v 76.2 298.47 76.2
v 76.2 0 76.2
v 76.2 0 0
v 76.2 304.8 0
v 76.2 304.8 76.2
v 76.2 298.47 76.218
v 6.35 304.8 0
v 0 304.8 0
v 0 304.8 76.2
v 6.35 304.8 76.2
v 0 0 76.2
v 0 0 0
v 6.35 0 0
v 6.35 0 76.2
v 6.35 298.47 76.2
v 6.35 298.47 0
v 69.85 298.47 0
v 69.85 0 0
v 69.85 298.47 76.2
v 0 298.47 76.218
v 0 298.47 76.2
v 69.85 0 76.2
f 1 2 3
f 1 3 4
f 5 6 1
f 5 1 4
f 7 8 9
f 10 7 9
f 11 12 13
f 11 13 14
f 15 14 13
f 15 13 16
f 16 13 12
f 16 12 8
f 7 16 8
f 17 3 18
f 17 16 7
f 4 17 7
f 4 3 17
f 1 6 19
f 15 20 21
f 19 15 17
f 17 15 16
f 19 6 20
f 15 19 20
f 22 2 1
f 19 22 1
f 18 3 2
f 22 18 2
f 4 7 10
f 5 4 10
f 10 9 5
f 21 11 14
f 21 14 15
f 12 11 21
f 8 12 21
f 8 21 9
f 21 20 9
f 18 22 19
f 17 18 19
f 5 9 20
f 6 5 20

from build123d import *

# Parameters (mm, degrees)
F0_W     = 304.8
F0_H     = 76.2
F1_DEPTH = 6.35
F3_DEPTH = 76.2
F5_W     = 304.7997951508
F5_H     = 76.2000009418
F6_DEPTH = 6.35


with BuildPart() as f1:
    # F0 (on Right) → F1 (new body)
    with BuildSketch(Plane.YZ):
        with Locations((152.4, 38.1)):
            Rectangle(F0_W, F0_H)
    extrude(amount=F1_DEPTH)

    # F2 (on Right) → F3 (join)
    with BuildSketch(Plane.YZ):
        Polygon((304.7999739647, 0), (304.7999739647, 76.2000977993), (298.4695136547, 76.2183889747), (298.4695136547, 0), align=None)
    extrude(amount=F3_DEPTH)

    # F5 (on offset) → F6 (join)
    with BuildSketch(Plane.YZ.offset(76.2)):
        with Locations((152.3998975754, 38.1000004709)):
            Rectangle(F5_W, F5_H)
    extrude(amount=-F6_DEPTH)


solid = f1.part
